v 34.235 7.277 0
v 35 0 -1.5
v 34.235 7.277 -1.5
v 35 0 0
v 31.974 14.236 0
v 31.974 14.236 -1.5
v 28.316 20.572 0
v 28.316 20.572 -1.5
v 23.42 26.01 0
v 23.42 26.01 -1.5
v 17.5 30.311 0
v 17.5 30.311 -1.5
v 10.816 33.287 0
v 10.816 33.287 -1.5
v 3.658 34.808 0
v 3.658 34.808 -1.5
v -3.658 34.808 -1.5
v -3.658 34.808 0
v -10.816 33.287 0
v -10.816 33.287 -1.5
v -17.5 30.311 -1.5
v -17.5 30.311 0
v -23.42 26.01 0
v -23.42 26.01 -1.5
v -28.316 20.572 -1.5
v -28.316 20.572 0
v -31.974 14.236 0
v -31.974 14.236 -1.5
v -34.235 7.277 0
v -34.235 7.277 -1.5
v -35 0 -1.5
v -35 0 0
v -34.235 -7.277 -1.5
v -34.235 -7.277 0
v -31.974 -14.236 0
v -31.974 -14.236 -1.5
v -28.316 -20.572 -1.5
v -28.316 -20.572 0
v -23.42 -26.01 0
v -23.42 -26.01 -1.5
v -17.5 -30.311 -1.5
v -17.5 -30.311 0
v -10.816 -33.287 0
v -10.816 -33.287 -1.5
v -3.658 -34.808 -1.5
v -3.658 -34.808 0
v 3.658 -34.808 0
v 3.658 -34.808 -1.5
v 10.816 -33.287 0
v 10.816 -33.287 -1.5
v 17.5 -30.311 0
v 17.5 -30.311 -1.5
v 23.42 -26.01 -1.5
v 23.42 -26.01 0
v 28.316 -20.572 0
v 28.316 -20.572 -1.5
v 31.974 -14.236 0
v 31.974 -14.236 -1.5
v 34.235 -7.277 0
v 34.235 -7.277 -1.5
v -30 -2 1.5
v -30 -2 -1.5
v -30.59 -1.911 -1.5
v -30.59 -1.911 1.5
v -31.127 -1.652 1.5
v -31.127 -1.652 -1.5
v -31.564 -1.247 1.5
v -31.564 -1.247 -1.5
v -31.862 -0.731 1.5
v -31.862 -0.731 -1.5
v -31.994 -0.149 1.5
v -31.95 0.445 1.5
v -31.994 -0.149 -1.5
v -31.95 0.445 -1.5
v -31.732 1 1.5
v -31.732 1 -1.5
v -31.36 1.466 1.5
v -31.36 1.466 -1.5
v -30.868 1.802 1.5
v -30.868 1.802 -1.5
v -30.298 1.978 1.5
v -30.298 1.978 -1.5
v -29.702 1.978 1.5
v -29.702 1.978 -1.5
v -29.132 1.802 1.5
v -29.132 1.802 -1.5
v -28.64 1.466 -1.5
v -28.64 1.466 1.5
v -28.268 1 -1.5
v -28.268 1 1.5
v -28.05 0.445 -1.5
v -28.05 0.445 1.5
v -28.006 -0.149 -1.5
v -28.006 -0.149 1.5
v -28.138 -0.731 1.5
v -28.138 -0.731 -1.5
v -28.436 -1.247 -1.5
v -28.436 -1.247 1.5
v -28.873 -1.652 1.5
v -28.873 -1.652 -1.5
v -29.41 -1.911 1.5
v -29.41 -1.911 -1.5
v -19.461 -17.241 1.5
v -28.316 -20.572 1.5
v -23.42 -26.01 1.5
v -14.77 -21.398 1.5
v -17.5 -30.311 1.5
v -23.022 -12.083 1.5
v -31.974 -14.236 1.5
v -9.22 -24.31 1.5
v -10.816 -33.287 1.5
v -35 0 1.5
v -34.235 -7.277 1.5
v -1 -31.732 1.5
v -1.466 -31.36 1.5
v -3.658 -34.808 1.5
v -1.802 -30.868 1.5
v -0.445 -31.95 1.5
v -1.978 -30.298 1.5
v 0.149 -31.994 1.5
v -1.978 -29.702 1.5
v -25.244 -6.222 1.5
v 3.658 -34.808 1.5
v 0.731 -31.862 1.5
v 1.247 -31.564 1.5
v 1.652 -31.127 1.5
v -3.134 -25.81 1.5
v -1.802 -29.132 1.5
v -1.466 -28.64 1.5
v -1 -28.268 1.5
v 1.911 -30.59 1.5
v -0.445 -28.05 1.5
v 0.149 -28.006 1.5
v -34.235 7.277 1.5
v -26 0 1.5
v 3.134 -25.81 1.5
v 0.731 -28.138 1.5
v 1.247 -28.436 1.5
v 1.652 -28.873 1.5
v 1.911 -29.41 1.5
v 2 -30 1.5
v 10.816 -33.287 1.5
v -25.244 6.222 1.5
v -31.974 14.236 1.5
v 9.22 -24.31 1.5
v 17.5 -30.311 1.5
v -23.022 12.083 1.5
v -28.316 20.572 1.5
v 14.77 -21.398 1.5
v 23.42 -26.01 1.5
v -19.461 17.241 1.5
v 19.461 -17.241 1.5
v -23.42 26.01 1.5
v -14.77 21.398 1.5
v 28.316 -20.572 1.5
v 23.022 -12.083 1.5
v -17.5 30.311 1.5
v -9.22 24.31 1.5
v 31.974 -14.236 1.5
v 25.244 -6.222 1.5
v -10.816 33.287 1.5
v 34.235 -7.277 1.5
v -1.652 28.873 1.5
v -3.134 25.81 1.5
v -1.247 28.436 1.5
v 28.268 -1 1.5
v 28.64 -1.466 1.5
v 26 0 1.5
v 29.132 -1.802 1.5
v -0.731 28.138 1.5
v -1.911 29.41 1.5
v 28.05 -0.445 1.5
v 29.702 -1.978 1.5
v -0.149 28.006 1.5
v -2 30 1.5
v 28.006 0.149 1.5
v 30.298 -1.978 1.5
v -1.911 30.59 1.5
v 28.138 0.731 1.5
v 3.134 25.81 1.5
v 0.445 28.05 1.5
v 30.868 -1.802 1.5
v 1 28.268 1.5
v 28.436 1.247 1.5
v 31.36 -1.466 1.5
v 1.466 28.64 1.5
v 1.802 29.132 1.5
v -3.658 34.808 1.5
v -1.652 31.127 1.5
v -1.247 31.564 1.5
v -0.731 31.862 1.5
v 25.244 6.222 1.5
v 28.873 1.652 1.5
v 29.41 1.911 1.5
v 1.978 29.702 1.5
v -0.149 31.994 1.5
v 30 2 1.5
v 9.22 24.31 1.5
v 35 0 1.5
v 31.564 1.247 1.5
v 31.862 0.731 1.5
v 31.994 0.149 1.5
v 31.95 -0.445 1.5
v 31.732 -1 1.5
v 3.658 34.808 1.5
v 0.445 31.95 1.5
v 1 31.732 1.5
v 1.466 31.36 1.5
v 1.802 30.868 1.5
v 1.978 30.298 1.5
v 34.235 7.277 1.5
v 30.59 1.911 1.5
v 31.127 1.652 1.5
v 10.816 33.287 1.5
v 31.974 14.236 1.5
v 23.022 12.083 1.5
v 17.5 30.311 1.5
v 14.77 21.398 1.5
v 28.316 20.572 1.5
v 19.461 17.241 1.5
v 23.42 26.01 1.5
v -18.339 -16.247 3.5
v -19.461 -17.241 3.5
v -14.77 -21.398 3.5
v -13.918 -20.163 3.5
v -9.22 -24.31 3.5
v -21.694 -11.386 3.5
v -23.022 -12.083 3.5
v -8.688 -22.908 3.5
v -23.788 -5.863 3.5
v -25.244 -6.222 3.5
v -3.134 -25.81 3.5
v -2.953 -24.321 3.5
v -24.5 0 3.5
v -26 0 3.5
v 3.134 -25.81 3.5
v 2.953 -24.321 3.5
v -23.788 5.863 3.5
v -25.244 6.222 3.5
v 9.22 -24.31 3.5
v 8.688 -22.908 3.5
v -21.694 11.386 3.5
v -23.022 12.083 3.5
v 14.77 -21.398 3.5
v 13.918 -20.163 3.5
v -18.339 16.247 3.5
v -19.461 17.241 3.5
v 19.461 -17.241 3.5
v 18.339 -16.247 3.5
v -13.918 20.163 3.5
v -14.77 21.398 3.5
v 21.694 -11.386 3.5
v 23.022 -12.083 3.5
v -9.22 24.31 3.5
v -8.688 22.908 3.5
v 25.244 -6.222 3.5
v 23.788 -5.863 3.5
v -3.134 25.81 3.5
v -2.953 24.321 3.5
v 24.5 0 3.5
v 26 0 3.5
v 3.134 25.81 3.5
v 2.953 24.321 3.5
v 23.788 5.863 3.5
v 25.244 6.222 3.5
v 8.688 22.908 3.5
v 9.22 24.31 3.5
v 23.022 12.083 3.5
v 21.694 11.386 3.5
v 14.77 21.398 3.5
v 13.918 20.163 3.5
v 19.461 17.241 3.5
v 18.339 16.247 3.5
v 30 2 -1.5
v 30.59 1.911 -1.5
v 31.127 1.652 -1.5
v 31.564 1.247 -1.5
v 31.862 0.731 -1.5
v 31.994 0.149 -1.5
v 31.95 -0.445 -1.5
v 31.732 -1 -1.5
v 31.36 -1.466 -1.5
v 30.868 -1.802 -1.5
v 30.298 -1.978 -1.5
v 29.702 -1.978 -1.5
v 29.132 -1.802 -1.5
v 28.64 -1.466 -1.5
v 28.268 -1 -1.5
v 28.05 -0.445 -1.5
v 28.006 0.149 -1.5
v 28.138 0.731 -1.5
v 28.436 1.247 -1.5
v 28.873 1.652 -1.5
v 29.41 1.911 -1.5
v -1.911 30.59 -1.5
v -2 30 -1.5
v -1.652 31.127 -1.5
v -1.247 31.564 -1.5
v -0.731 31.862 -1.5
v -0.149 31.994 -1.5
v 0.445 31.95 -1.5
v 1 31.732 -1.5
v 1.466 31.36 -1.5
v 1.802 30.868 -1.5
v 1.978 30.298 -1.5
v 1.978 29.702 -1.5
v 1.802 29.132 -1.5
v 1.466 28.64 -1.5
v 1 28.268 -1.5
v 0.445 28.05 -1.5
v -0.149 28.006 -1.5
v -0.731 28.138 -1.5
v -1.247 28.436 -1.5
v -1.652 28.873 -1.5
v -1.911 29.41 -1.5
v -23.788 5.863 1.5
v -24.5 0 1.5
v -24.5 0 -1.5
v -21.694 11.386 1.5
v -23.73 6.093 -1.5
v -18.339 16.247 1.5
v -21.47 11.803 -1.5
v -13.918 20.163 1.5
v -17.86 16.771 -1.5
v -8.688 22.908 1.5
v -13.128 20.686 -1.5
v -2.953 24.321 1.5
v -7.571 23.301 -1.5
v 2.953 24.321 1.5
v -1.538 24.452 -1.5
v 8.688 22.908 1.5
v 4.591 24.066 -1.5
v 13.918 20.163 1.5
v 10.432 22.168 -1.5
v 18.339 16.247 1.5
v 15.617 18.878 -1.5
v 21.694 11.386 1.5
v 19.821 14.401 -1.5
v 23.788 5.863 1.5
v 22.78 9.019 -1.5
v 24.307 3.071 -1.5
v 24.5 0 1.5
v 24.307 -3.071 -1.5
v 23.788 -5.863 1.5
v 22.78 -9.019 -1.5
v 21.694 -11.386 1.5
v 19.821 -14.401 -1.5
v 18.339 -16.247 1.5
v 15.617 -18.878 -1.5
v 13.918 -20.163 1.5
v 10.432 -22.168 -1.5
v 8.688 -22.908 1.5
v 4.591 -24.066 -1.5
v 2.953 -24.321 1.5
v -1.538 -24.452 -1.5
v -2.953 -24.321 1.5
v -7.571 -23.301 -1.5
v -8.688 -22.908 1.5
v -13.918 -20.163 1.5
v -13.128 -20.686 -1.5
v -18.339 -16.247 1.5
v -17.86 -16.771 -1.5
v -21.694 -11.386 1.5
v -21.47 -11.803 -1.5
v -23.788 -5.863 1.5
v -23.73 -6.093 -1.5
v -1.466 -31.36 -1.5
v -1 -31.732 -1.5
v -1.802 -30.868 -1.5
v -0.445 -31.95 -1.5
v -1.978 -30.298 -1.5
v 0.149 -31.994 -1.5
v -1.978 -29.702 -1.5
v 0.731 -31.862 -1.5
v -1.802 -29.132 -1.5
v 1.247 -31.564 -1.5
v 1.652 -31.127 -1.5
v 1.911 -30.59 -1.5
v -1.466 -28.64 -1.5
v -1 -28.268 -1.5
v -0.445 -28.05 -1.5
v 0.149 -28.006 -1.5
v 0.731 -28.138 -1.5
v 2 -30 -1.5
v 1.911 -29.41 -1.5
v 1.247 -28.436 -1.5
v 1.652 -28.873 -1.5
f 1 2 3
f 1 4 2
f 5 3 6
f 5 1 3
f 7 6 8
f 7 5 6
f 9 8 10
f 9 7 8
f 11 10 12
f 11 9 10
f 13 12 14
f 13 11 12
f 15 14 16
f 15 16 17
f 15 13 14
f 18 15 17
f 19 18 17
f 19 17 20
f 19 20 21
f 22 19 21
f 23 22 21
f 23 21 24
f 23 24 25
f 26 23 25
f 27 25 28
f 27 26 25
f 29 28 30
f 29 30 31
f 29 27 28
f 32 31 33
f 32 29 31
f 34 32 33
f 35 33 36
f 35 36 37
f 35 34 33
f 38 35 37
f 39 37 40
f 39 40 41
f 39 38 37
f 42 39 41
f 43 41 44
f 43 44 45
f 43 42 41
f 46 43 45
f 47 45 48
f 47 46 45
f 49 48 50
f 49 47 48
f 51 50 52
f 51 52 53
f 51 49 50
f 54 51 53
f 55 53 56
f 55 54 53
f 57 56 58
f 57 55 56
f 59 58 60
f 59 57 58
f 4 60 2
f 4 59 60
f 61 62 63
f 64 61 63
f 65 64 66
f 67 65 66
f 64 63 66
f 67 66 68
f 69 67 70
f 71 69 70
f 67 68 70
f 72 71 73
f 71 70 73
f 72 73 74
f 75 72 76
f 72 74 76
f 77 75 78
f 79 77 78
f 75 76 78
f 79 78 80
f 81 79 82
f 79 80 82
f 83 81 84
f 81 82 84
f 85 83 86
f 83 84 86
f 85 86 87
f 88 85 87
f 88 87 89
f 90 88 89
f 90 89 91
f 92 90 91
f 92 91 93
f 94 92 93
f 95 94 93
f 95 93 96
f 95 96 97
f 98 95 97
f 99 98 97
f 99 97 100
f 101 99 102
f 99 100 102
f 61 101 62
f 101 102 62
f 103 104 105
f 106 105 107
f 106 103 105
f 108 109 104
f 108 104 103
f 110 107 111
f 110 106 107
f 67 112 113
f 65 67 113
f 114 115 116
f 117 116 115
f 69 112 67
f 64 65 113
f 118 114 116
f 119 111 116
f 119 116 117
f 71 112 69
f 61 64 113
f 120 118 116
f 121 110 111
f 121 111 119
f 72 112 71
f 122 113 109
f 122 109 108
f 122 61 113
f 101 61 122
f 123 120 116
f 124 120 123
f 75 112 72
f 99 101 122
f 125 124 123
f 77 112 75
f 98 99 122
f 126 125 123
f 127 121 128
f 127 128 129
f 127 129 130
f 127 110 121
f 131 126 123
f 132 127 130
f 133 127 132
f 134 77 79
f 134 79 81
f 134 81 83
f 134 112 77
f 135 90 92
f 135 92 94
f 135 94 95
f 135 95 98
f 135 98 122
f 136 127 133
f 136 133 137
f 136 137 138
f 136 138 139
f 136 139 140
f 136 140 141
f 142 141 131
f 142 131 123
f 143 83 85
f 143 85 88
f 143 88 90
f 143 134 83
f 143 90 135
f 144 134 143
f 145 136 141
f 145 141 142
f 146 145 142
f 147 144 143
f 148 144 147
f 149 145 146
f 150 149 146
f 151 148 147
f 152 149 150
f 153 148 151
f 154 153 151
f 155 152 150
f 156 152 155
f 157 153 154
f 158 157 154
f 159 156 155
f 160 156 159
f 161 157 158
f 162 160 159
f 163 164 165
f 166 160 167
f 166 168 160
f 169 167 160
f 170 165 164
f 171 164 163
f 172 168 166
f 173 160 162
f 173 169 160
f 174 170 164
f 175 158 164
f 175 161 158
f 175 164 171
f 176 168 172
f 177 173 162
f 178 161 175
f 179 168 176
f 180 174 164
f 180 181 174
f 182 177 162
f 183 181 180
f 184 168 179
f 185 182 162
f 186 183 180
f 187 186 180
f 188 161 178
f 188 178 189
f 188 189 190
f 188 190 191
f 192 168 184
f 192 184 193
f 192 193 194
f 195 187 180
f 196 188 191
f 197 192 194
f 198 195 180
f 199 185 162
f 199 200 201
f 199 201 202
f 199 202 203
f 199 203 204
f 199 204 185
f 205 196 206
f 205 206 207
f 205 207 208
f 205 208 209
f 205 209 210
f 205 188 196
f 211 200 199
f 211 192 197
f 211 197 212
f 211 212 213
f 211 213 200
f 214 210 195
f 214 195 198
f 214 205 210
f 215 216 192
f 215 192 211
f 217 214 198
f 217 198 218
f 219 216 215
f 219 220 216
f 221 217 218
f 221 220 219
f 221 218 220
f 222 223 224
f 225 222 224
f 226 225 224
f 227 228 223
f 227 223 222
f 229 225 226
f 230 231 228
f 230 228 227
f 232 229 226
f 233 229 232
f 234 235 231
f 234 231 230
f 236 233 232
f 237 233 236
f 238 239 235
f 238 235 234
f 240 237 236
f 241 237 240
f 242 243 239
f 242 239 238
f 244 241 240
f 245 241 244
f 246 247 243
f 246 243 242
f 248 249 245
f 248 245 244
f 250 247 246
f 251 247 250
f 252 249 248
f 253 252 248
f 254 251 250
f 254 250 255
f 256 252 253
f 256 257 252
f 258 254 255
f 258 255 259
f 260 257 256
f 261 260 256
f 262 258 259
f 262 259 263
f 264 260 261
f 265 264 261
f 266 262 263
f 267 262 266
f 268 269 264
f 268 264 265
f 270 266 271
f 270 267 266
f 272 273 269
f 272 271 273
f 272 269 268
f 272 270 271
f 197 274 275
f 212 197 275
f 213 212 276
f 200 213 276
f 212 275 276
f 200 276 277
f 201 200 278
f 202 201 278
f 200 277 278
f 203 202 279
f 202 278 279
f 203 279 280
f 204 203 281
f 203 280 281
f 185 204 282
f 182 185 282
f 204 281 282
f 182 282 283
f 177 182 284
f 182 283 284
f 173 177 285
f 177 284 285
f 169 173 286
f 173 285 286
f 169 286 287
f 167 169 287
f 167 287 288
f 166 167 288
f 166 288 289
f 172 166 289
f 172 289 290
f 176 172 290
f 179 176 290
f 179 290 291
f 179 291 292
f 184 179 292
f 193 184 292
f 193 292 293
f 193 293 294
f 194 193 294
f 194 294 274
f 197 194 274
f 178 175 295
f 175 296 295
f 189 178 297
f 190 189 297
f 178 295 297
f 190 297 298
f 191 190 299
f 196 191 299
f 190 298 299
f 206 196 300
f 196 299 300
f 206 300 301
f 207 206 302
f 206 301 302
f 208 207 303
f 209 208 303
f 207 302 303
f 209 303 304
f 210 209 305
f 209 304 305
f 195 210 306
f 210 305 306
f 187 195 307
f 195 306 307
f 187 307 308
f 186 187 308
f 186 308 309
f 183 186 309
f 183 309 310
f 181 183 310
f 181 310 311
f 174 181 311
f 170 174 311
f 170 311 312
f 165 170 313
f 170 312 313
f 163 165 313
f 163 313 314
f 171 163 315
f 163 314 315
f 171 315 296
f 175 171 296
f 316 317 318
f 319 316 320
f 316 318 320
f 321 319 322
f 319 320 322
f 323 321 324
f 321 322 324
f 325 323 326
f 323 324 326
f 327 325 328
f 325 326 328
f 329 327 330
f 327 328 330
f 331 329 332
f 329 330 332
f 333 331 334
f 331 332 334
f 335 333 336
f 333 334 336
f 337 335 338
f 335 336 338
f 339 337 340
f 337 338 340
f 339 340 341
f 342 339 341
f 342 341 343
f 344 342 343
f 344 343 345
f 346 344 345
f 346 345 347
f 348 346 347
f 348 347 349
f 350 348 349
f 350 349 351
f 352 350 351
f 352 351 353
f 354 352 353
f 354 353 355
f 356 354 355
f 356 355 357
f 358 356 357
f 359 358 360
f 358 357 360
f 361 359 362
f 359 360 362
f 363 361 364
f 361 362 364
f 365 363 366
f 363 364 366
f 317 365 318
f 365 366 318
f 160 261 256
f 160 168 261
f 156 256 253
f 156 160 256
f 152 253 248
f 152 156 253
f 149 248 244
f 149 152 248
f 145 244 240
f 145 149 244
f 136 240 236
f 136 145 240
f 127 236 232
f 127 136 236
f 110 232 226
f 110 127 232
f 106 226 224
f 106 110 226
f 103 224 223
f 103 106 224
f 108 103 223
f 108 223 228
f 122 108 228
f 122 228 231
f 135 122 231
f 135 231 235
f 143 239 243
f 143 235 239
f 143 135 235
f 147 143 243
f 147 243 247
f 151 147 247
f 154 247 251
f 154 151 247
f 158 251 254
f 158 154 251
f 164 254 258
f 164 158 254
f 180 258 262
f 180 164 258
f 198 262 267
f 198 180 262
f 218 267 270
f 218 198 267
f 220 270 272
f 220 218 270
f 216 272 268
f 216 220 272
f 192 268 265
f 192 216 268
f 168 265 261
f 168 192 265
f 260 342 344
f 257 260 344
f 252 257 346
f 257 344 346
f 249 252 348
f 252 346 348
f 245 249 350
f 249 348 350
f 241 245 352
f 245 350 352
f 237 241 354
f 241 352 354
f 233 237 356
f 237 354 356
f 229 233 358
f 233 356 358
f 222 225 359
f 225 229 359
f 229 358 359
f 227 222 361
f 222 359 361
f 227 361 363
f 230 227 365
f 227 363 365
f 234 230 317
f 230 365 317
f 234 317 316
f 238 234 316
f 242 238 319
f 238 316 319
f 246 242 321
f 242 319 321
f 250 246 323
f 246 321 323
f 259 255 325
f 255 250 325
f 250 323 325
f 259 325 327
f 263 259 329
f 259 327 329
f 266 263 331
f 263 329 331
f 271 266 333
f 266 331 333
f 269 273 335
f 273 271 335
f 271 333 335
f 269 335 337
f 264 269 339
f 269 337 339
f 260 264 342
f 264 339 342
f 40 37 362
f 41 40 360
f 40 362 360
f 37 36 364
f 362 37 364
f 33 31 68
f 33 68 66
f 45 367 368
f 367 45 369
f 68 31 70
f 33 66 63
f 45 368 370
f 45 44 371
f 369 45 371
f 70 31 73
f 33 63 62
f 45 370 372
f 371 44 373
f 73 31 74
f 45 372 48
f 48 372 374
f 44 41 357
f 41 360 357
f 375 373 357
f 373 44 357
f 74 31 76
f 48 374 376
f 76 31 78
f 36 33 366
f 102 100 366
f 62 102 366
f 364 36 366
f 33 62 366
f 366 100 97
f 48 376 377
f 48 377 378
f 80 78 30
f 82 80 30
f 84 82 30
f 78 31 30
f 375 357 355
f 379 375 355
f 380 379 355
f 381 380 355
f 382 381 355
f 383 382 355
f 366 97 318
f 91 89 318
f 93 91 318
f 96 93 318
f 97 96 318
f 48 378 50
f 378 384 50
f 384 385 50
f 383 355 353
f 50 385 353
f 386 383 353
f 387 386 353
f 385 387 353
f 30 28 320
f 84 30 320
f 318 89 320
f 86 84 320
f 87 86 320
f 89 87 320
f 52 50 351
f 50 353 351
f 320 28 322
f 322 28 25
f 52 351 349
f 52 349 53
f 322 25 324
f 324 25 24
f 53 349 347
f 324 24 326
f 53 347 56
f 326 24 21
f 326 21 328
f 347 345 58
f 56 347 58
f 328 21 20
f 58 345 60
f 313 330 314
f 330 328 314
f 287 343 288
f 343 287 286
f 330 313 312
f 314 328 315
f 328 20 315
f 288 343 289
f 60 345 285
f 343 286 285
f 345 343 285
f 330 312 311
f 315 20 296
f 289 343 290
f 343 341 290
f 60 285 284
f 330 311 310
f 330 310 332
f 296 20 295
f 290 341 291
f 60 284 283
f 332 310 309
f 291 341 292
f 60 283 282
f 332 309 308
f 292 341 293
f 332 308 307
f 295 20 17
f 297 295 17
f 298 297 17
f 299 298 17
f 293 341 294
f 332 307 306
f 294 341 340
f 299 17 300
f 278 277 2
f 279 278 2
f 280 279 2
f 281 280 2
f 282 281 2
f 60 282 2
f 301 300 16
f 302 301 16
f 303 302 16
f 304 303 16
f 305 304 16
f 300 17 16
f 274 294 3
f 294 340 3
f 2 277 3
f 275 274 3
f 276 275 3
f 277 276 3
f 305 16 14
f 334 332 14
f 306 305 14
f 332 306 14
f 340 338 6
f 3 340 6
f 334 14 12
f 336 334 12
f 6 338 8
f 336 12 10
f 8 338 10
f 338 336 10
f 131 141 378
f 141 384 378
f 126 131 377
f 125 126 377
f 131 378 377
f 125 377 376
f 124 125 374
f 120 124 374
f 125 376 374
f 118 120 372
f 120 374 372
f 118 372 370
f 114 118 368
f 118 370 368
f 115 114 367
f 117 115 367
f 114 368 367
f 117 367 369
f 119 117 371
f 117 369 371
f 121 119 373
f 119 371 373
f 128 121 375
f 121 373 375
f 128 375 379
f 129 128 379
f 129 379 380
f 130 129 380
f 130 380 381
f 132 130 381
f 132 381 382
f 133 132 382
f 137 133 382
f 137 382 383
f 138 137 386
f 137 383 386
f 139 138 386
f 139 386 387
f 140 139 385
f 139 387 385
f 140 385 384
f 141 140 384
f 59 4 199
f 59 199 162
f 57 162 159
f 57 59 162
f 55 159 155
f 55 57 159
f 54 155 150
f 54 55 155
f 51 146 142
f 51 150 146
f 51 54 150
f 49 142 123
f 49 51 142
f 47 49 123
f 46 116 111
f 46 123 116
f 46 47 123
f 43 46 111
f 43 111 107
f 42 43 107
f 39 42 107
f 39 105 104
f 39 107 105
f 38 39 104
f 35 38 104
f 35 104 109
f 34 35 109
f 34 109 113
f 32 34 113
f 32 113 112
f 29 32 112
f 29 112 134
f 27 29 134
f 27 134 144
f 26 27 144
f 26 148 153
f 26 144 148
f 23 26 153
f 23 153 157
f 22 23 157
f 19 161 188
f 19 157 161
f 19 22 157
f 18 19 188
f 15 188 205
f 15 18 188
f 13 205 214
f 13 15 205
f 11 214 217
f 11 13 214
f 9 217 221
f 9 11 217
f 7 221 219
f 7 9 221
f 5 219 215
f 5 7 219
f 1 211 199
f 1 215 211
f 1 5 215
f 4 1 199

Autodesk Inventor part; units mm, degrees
ref_plane "YZ Plane" through (0, 0, 0) normal (1, 0, 0) x (0, 1, 0)
ref_plane "XZ Plane" through (0, 0, 0) normal (0, 1, 0) x (-1, 0, 0)
ref_plane "XY Plane" through (0, 0, 0) normal (0, 0, 1) x (1, 0, 0)
sketch "Sketch1" plane through (0, 0, 0) normal (0, 0, 1) x (1, 0, 0)
  circle A0 centre (0, 0) radius 35
  dimension "d0" = 70
extrude "Extrusion1" add sketch "Sketch1" along normal mid plane 3
sketch "Sketch2" plane through (0, 0, 1.5) normal (0, 0, 1) x (1, 0, 0)
  circle A0 centre (0, 0) radius 26
  circle A1 centre (0, 0) radius 24.5
  dimension "d3" = 52
  dimension "d4" = 49
extrude "Extrusion2" add sketch "Sketch2" along normal blind 2
sketch "Sketch3" plane through (0, 0, -1.5) normal (0, 0, -1) x (-1, 0, 0)
  circle A0 centre (0, 0) radius 24.5
  dimension "d7" = 49
extrude "Extrusion3" cut sketch "Sketch3" against normal through all
sketch "Sketch5" plane through (0, 0, -1.5) normal (0, 0, -1) x (-1, 0, 0)
  circle A0 centre (0, 30) radius 2
  point P0 (0, 0)
  dimension "d17" = 4
  dimension "d18" = 30
extrude "Extrusion5" cut sketch "Sketch5" against normal through all
pattern_circular "Circular Pattern2" count 4 over 360 about axis through (0, 0, -10) along (0, 0, 1) of "Extrusion5"
thread "Thread1" size "M4x0.5" class "6H" standard "ANSI Metric M Profile" full length
thread "Thread2" size "M4x0.7" class "6H" standard "ANSI Metric M Profile" full length
thread "Thread3" size "M4x0.7" class "6H" standard "ANSI Metric M Profile" full length
thread "Thread4" size "M4x0.7" class "6H" standard "ANSI Metric M Profile" full length
properties part number "Flantza_Forea1"
